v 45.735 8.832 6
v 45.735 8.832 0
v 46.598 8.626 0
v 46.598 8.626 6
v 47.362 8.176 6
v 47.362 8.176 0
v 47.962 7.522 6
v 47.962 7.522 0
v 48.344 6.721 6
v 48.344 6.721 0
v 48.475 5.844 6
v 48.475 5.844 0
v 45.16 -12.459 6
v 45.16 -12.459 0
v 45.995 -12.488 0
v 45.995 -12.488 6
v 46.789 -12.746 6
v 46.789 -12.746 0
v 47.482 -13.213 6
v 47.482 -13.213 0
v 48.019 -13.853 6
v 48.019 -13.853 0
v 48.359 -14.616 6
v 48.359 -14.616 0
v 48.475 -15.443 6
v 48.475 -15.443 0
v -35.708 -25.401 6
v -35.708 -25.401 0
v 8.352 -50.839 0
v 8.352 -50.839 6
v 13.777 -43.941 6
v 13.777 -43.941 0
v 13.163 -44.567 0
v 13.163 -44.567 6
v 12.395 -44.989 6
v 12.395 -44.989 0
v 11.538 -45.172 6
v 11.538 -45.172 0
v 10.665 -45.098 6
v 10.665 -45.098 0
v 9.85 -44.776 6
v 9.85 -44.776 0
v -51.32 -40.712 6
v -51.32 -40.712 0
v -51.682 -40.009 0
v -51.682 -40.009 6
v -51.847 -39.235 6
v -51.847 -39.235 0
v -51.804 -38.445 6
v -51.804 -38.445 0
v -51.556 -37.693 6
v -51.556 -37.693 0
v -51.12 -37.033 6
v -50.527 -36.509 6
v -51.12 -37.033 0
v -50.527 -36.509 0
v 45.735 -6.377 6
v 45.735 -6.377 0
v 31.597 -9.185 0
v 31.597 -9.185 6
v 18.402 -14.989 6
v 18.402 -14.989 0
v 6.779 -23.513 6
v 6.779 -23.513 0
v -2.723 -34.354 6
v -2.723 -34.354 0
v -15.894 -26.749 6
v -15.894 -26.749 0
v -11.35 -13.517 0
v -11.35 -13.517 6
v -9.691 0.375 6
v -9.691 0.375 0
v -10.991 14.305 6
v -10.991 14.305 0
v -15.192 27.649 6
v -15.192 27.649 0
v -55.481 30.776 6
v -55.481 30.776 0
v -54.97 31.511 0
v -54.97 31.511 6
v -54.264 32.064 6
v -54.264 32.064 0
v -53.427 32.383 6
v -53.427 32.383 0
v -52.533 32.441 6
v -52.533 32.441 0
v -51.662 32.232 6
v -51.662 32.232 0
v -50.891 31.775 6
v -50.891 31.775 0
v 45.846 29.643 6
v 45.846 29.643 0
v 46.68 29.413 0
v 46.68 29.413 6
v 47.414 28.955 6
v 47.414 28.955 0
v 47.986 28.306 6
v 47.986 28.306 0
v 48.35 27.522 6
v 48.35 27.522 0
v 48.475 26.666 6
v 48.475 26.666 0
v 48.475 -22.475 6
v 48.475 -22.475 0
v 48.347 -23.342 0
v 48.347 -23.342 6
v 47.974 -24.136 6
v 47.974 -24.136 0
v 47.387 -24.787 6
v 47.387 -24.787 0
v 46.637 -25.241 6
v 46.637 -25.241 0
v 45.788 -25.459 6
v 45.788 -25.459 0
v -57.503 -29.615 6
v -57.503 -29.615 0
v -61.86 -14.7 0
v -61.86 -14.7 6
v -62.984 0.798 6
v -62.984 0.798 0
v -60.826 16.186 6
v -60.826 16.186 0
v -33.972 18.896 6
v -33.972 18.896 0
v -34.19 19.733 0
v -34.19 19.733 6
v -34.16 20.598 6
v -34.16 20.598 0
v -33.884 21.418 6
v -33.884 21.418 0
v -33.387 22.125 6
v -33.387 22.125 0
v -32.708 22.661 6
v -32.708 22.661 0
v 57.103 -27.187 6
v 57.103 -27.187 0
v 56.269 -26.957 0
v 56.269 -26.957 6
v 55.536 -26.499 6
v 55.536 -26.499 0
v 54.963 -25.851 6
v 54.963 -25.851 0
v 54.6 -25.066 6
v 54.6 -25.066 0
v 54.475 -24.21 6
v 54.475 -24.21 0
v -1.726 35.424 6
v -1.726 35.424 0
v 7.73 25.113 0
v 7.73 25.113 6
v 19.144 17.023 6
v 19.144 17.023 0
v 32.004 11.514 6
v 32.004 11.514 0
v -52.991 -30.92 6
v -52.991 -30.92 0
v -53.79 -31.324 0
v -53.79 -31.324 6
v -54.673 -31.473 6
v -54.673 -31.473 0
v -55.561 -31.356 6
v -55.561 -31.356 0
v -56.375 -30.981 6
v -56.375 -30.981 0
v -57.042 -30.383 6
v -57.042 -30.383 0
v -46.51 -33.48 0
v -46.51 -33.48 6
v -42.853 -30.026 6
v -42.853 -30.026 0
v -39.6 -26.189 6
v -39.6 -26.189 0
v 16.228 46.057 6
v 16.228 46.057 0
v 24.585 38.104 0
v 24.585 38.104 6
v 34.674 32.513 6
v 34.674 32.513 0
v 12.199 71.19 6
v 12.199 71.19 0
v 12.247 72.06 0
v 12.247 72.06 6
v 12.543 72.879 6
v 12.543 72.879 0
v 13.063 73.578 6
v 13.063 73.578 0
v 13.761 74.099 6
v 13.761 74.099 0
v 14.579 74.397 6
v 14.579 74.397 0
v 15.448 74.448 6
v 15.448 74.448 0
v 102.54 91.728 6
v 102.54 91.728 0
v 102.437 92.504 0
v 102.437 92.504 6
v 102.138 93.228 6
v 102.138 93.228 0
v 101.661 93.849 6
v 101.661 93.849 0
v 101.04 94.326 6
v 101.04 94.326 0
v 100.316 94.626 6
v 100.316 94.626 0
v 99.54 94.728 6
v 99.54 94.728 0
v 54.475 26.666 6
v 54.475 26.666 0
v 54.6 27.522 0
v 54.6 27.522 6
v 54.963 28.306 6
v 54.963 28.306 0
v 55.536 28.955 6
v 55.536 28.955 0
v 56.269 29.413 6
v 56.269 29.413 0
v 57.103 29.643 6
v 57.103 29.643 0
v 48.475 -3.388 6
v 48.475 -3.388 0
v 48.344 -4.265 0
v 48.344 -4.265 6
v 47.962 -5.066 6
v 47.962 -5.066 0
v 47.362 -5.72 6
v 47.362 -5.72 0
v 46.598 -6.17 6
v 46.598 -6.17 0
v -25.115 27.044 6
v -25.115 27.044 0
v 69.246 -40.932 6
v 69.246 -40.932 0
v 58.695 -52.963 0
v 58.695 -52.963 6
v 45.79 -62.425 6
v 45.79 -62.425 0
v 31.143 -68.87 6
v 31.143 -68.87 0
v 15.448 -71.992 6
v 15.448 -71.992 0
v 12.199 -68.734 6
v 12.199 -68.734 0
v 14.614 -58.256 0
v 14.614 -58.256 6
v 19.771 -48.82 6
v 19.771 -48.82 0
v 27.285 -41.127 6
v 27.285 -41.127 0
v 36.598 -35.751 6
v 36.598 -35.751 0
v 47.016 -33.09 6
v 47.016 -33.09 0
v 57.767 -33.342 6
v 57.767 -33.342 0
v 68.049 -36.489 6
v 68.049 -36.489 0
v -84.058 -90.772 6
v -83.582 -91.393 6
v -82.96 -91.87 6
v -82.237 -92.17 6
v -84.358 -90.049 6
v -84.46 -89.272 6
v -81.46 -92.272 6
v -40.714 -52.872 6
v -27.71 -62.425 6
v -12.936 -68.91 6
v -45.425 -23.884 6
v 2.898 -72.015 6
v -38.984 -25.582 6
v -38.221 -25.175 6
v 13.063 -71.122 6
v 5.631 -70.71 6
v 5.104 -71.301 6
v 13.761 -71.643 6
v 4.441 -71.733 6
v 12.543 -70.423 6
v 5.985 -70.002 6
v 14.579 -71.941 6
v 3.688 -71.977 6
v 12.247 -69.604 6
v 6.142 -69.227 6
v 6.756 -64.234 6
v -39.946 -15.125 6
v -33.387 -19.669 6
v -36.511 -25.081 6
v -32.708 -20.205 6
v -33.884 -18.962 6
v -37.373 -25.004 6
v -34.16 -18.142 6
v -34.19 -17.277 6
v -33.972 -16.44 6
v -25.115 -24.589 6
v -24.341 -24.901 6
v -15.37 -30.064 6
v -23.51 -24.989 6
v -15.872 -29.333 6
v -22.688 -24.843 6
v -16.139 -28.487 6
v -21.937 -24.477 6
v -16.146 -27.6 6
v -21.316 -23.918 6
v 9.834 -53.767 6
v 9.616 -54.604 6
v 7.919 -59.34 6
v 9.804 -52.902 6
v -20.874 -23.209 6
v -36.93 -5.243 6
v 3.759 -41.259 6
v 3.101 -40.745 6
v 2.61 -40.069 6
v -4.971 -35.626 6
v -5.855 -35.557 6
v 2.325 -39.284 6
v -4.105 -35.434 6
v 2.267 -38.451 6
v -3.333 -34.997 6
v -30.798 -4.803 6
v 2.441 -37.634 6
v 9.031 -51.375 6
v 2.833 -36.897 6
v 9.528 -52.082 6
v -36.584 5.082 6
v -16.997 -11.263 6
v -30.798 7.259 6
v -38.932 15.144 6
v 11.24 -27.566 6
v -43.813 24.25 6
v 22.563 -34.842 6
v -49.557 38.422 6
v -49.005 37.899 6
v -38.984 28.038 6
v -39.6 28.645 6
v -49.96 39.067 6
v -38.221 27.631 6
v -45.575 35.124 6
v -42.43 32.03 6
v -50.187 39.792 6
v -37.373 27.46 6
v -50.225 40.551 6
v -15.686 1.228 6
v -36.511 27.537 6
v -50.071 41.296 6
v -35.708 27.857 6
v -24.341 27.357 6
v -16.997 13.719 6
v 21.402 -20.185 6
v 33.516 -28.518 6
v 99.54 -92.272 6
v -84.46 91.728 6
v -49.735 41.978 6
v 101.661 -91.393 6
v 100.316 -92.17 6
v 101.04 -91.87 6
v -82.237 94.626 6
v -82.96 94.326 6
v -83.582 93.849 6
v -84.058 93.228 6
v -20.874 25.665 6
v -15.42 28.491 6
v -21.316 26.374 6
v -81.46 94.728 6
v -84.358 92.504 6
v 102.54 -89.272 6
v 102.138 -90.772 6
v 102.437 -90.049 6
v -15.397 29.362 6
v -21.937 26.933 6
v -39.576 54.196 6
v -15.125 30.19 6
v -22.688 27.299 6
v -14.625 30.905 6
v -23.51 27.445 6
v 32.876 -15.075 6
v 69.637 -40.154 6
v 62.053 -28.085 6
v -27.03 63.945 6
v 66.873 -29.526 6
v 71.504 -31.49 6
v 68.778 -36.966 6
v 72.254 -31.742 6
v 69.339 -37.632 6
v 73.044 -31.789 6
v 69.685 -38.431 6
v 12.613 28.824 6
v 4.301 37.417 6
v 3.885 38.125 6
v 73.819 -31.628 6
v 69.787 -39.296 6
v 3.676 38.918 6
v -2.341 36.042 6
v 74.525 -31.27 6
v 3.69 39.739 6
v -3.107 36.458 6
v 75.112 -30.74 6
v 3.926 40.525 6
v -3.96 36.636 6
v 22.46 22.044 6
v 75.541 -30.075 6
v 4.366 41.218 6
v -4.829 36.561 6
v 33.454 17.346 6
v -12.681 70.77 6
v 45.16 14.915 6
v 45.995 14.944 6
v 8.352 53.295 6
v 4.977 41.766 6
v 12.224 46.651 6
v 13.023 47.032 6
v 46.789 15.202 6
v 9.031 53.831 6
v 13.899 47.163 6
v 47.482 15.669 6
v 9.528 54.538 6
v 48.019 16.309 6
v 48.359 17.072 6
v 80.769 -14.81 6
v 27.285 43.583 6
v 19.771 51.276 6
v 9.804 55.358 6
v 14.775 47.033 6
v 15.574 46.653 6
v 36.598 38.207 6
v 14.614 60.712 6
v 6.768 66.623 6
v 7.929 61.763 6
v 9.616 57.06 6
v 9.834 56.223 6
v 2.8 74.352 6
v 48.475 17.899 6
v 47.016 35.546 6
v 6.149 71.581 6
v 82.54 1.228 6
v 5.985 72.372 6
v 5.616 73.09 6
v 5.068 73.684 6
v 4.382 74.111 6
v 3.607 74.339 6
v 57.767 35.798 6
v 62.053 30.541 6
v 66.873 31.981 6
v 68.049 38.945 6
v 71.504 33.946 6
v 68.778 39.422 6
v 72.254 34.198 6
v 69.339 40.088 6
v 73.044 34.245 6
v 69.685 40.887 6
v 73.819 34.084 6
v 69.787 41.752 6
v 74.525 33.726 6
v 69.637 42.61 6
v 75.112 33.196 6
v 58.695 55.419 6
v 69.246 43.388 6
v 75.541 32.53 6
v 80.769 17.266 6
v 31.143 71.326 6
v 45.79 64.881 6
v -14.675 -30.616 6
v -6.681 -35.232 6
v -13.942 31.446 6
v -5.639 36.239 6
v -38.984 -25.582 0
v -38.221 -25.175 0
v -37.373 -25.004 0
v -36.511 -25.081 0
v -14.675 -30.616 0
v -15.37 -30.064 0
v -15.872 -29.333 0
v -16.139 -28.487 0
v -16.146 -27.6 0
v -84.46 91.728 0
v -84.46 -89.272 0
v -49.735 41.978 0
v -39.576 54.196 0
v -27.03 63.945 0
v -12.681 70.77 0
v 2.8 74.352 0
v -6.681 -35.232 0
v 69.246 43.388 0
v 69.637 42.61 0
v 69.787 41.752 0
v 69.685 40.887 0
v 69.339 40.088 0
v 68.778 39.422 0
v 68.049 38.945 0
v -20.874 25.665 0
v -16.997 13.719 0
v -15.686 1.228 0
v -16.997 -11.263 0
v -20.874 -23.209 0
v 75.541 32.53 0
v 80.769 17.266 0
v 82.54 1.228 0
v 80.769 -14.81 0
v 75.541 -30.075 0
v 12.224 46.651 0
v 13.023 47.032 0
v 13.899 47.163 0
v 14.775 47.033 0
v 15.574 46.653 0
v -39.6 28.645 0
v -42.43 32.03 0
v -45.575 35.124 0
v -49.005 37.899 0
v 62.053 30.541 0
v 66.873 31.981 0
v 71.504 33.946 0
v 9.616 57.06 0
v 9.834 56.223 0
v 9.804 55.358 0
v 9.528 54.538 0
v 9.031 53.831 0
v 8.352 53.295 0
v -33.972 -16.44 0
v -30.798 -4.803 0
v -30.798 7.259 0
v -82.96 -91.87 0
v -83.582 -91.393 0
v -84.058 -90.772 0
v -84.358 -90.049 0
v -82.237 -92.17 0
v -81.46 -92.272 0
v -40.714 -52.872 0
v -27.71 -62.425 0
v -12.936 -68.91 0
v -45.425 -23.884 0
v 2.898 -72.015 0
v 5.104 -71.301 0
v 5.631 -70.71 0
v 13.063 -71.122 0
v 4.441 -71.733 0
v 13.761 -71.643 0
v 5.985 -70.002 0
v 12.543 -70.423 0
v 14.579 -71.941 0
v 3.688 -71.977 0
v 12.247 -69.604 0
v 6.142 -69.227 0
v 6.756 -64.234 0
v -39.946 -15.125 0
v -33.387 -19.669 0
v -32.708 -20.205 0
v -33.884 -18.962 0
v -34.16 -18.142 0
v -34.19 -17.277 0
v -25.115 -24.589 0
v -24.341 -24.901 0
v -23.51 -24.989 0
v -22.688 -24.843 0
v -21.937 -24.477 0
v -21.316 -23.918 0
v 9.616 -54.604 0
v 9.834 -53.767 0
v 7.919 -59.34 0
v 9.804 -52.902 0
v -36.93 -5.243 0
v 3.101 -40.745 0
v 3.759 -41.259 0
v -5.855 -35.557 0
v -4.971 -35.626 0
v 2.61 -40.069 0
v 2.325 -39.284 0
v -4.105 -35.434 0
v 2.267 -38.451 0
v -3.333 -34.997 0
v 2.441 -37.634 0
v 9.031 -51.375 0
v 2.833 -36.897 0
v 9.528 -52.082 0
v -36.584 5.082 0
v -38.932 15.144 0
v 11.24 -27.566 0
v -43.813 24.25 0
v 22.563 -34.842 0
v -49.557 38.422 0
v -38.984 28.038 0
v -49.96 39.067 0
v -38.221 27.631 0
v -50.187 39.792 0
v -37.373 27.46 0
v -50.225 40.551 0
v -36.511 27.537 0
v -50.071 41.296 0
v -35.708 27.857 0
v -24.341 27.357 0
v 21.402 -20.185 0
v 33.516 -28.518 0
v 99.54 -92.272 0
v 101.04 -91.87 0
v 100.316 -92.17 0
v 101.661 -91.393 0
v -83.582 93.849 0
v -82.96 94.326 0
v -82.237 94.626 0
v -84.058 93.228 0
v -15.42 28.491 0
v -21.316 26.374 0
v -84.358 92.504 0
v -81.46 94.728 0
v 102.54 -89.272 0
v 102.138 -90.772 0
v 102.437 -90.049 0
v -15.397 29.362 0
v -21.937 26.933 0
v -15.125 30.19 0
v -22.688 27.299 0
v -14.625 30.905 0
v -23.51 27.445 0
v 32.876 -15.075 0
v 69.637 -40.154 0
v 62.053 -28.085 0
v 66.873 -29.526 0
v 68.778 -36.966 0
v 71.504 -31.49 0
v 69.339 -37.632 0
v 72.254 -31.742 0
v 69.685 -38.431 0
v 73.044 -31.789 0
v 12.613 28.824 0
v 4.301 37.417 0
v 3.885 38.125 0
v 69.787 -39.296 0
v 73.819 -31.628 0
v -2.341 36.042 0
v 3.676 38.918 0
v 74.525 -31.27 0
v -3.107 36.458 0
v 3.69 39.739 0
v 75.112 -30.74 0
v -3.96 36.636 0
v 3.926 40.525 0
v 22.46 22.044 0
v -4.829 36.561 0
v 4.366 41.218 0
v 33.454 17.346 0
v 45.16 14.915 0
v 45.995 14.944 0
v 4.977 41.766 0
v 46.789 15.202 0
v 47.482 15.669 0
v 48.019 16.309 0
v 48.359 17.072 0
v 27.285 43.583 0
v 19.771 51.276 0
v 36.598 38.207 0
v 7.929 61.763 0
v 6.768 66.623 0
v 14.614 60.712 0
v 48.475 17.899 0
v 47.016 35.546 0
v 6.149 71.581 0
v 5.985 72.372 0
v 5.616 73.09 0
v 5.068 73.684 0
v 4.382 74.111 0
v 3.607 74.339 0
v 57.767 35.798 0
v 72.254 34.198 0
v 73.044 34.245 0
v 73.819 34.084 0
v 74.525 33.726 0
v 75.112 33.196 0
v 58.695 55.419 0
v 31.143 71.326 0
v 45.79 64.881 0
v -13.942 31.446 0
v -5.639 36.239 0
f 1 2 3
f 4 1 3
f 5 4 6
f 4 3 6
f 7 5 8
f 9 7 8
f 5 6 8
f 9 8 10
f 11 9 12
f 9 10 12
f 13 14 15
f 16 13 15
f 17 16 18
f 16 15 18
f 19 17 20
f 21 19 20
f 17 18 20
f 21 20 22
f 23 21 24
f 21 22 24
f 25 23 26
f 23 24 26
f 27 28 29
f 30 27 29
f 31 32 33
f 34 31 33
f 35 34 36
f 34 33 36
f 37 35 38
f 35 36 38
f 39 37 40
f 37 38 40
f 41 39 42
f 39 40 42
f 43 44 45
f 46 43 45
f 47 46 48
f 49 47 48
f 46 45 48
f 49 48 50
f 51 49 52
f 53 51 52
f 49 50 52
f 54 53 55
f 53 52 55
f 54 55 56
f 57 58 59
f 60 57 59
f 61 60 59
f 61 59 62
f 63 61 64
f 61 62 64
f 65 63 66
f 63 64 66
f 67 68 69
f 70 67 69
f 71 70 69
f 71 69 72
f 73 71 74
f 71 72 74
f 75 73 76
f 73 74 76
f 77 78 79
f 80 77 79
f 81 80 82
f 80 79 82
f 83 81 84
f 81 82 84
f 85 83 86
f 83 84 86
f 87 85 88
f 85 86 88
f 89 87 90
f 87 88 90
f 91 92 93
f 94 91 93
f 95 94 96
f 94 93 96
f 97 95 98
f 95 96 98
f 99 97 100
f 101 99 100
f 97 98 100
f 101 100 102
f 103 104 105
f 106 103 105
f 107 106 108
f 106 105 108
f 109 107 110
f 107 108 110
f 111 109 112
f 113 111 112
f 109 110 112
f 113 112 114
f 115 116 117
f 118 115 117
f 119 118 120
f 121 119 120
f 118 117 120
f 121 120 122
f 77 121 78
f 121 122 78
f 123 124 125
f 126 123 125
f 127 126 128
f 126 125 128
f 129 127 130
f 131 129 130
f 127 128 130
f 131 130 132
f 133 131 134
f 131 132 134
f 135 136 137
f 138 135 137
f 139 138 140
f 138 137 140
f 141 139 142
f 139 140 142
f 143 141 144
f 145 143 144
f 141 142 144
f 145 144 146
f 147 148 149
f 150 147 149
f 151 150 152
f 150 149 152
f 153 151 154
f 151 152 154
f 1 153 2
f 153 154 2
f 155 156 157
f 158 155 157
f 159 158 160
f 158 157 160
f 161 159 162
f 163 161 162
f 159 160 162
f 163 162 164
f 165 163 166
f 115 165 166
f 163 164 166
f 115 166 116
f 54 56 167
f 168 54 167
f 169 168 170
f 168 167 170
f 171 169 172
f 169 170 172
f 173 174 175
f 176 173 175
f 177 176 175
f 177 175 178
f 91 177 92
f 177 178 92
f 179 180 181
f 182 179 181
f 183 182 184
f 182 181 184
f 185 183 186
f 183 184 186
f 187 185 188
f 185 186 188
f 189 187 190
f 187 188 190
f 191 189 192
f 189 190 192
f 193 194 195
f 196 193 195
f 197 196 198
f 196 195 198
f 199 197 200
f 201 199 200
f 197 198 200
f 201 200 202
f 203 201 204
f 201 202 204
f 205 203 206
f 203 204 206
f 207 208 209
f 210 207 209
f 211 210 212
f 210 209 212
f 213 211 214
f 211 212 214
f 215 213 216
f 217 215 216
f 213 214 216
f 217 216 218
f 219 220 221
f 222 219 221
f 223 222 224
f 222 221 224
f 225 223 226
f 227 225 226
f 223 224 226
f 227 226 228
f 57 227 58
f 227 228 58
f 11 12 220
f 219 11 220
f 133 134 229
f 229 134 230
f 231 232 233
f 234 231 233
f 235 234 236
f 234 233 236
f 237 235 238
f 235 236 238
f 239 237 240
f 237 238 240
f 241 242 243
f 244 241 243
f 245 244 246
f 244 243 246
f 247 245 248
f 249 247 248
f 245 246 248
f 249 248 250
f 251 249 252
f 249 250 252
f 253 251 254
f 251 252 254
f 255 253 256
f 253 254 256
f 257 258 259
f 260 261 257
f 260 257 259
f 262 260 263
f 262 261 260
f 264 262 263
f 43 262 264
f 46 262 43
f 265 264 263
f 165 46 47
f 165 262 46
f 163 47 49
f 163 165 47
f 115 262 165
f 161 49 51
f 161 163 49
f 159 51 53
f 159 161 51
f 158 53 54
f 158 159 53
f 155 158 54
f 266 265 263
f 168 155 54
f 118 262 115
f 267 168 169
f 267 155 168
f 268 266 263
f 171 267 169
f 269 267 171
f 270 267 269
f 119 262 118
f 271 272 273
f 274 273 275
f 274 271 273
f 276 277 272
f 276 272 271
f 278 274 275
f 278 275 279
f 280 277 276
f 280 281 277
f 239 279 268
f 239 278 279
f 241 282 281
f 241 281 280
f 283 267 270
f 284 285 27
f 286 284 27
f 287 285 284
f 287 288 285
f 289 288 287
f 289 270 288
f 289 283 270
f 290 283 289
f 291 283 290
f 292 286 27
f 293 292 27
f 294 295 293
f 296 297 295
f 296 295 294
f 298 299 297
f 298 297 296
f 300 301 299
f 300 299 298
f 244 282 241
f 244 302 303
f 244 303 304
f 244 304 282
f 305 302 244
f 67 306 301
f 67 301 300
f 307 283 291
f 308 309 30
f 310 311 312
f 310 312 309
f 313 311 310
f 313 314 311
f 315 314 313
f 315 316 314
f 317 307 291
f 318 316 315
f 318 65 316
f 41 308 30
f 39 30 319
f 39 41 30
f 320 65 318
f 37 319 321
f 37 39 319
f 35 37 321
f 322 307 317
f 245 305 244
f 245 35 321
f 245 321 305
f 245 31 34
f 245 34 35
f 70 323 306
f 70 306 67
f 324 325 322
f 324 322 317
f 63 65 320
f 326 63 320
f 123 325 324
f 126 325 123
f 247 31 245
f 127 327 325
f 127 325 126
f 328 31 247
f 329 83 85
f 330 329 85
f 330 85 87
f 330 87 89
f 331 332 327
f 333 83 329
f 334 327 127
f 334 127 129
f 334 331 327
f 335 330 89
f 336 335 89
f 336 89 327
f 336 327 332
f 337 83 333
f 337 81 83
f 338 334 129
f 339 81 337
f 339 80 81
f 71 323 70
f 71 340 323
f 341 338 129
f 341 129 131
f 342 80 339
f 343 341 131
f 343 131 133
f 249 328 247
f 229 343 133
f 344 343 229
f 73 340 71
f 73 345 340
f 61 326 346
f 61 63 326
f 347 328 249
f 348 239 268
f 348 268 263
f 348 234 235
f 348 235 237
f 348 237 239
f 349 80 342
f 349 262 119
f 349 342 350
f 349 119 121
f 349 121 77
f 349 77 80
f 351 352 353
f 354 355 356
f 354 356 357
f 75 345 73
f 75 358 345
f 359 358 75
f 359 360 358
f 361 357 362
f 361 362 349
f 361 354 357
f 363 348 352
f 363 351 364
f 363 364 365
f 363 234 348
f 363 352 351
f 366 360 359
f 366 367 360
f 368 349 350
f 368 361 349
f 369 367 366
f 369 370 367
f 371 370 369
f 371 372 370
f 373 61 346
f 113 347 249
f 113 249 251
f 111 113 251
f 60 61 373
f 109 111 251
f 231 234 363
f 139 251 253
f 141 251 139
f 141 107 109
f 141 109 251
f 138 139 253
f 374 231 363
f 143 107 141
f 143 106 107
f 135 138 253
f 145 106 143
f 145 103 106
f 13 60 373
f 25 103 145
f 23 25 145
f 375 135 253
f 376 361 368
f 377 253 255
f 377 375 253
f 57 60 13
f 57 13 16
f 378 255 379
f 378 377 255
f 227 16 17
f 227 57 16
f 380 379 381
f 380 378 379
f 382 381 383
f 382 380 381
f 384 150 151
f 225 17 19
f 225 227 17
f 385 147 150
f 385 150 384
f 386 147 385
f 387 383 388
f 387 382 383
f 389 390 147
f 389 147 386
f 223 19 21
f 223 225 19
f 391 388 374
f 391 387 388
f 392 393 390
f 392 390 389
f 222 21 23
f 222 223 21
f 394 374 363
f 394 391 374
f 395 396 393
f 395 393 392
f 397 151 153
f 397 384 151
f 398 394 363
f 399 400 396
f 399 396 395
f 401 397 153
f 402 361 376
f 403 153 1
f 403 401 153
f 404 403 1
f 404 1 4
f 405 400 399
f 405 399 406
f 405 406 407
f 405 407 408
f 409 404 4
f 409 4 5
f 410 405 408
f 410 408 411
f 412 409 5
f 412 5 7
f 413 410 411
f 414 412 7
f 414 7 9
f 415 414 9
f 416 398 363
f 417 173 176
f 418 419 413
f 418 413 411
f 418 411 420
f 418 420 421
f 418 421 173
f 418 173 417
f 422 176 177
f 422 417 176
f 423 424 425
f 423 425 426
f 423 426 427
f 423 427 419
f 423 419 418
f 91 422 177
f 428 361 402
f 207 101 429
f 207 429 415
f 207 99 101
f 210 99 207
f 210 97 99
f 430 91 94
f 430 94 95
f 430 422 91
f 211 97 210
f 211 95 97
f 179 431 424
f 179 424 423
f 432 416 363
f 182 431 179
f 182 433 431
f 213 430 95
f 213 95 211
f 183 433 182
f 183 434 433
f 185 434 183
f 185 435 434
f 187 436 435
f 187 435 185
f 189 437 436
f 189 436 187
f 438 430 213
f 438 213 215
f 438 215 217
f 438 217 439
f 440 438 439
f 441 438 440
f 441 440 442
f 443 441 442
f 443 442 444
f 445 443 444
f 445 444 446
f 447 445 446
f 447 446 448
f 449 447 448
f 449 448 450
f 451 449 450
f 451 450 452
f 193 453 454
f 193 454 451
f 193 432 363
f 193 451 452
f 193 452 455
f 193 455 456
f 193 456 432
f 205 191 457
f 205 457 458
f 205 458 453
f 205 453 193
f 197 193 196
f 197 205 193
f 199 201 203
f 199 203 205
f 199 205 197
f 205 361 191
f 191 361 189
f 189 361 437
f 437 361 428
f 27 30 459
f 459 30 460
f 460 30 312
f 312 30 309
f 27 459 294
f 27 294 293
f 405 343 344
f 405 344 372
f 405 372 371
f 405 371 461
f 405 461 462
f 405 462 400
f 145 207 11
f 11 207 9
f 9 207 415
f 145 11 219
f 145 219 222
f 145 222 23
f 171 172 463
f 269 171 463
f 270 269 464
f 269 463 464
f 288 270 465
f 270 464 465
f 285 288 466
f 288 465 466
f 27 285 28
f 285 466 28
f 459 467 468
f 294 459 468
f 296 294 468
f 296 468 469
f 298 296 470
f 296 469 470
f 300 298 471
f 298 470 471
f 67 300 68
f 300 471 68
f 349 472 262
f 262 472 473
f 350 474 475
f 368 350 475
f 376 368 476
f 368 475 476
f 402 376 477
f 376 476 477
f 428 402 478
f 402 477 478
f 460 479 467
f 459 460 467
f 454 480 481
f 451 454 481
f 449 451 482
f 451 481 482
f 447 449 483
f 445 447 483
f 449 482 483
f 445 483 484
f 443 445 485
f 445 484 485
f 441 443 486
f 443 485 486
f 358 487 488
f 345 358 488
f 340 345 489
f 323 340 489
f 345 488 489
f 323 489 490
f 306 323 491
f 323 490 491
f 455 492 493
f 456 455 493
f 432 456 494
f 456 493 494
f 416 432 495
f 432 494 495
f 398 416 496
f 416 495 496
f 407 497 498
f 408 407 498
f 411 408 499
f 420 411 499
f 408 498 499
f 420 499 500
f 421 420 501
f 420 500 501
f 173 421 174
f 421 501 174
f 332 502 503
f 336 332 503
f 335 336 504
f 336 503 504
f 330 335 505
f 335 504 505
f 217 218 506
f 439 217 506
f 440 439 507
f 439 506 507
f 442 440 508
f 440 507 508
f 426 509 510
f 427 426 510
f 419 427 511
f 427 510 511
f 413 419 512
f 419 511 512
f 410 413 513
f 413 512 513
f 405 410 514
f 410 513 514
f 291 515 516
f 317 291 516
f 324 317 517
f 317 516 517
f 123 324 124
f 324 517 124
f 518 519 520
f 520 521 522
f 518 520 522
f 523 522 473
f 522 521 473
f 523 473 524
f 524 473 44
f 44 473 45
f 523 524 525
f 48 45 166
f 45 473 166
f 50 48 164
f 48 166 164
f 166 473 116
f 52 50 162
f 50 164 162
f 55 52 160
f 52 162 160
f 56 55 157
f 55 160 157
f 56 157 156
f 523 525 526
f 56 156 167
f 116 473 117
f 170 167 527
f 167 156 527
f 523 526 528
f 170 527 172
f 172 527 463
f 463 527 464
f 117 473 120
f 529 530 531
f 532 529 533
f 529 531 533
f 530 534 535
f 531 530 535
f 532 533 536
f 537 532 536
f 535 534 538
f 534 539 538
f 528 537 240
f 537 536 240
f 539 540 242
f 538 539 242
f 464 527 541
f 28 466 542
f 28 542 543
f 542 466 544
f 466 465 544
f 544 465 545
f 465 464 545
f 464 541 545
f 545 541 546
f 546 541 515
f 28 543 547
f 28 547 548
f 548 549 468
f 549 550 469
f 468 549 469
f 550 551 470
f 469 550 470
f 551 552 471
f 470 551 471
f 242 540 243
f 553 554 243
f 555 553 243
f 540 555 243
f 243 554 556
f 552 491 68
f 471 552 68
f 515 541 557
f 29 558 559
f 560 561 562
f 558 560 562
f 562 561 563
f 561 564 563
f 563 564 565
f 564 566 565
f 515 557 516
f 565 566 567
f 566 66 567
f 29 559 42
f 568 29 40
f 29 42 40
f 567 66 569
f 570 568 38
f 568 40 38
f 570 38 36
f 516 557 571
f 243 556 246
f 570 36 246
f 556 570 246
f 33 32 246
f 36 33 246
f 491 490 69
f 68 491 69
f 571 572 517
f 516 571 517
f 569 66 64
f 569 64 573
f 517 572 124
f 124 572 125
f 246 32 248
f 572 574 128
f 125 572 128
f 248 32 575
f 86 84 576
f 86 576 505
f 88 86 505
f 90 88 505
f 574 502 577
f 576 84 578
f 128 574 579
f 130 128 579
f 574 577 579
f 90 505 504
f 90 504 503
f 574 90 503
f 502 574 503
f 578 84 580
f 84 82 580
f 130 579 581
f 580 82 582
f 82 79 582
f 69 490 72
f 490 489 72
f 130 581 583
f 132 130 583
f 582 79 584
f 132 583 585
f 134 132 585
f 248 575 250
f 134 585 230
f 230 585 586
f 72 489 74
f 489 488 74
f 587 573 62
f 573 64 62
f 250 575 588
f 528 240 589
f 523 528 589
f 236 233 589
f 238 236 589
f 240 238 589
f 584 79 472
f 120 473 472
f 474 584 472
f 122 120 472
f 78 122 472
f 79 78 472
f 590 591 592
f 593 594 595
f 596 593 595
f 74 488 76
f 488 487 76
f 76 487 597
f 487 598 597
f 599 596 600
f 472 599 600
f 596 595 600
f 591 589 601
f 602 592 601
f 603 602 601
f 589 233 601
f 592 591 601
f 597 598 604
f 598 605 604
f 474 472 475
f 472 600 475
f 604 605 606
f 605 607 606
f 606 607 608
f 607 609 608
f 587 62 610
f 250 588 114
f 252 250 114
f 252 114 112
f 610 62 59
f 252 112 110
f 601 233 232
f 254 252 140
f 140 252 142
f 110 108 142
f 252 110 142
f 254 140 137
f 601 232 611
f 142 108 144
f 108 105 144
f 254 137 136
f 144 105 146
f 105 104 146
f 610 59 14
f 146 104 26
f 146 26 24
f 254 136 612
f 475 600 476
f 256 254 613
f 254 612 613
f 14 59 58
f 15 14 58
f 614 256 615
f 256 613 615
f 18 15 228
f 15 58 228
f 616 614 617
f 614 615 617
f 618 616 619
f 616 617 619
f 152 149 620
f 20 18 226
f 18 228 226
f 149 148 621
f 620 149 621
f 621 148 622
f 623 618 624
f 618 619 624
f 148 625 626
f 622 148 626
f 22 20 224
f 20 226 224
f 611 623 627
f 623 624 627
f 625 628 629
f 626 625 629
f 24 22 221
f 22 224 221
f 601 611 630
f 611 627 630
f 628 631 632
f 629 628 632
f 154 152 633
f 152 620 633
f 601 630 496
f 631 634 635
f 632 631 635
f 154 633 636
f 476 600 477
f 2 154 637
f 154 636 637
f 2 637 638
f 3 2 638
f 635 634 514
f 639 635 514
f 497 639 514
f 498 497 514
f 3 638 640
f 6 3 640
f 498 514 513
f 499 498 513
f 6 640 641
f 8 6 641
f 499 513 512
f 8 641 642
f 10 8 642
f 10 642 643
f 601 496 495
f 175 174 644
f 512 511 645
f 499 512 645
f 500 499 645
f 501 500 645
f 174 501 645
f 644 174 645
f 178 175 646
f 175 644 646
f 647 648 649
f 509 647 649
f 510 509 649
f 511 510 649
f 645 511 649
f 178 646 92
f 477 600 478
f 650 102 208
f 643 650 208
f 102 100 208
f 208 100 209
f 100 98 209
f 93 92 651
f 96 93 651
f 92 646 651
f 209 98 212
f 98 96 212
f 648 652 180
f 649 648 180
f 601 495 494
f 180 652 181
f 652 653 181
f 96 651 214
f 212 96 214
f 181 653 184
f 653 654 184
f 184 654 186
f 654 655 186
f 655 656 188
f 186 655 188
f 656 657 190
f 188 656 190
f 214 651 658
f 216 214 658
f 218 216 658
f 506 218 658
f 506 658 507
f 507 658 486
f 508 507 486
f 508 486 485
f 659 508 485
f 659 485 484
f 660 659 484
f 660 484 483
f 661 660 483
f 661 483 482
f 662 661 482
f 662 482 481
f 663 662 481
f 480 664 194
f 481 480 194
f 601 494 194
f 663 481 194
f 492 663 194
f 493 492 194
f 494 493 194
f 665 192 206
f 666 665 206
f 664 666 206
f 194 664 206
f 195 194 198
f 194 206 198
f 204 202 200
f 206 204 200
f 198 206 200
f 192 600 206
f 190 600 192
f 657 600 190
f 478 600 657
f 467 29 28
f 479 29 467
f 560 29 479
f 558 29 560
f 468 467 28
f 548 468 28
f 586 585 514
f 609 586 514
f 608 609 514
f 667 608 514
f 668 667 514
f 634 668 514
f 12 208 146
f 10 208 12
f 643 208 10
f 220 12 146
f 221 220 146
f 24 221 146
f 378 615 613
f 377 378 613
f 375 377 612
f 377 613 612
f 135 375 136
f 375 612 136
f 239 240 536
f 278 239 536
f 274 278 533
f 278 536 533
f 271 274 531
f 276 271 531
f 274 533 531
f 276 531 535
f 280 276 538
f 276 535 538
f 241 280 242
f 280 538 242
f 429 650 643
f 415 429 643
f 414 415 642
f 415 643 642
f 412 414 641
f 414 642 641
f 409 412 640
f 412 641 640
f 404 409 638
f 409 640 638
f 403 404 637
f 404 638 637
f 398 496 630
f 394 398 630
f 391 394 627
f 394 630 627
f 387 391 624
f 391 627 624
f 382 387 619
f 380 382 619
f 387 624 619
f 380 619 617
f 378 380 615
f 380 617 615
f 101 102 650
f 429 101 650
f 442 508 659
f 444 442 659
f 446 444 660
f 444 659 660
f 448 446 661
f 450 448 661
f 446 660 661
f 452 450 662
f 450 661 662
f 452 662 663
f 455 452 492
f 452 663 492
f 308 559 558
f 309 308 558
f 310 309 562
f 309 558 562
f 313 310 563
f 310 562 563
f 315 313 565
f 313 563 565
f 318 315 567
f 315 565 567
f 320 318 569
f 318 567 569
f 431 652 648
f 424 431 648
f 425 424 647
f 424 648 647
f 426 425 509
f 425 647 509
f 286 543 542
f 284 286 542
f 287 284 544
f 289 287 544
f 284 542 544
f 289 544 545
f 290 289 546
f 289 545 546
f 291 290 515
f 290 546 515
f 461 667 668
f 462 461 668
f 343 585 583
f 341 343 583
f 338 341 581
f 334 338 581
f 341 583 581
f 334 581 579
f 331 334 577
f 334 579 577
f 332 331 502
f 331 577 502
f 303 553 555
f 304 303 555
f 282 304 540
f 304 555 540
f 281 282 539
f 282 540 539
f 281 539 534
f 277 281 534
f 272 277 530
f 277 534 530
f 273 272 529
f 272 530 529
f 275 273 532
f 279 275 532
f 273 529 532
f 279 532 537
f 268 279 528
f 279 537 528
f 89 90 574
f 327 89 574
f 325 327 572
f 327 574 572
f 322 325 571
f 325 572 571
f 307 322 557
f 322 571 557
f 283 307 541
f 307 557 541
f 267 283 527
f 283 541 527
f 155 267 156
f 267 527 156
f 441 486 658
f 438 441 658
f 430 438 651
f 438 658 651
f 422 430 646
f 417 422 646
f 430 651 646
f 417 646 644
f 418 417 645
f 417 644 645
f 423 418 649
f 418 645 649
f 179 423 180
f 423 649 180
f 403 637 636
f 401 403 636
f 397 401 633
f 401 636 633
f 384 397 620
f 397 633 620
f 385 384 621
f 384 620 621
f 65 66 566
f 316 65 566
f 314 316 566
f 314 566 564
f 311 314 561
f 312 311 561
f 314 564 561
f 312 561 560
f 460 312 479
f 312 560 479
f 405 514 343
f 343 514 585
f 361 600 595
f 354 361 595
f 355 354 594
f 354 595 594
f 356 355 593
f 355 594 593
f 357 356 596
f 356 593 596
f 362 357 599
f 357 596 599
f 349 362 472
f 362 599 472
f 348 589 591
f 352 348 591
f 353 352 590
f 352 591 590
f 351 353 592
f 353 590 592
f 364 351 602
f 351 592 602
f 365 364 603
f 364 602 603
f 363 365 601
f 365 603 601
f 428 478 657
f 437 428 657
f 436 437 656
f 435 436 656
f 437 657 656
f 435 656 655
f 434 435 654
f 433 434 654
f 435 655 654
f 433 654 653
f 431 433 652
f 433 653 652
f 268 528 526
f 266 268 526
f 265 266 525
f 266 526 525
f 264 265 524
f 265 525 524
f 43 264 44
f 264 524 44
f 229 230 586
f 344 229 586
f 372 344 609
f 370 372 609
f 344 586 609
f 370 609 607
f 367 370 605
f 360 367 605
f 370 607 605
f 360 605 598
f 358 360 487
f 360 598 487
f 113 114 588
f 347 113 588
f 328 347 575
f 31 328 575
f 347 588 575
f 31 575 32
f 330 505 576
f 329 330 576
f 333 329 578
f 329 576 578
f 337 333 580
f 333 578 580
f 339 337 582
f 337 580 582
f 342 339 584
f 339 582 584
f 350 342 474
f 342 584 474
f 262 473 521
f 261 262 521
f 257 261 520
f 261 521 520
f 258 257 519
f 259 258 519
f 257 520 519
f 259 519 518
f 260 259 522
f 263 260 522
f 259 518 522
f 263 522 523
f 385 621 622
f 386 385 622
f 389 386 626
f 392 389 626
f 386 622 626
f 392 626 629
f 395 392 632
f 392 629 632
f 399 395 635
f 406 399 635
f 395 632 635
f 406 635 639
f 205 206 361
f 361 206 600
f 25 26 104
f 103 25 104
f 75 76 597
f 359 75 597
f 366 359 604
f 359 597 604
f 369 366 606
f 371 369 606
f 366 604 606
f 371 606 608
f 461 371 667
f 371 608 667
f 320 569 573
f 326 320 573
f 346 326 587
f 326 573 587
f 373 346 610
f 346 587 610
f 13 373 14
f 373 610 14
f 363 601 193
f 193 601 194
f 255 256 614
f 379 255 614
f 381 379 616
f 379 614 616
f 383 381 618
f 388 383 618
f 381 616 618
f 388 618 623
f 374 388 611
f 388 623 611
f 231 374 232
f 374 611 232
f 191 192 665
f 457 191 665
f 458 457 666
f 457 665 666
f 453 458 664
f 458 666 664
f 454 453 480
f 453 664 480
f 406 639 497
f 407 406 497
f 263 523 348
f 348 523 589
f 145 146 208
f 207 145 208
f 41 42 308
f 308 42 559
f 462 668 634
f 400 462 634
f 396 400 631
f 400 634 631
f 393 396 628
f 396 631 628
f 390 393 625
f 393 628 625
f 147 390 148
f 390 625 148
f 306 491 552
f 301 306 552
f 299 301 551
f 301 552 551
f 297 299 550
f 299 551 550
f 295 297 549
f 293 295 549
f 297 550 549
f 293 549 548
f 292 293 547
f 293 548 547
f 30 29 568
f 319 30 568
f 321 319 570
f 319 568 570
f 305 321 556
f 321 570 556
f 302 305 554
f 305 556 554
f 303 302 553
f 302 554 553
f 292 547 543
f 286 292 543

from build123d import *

# Parameters (mm, degrees)
F1_DEPTH = 6


with BuildPart() as f1:
    # F0 (on Top) → F1 (new body)
    with BuildSketch(Plane.XY):
        with BuildLine():
            Line((99.539605, 94.727916), (-81.460395, 94.727916))
            ThreePointArc((-81.460395, 94.727916), (-83.581716, 93.849236), (-84.460395, 91.727916))
            Line((-84.460395, 91.727916), (-84.460395, -89.272084))
            ThreePointArc((-84.460395, -89.272084), (-83.581716, -91.393405), (-81.460395, -92.272084))
            Line((-81.460395, -92.272084), (99.539605, -92.272084))
            ThreePointArc((99.539605, -92.272084), (101.660925, -91.393405), (102.539605, -89.272084))
            Line((102.539605, -89.272084), (102.539605, 91.727916))
            ThreePointArc((102.539605, 91.727916), (101.660925, 93.849236), (99.539605, 94.727916))
        make_face()
        with BuildLine():
            ThreePointArc((9.615662, -54.603753), (7.269883, -61.770541), (6.141787, -69.226607))
            ThreePointArc((6.141787, -69.226607), (5.104101, -71.300549), (2.89785, -72.015028))
            ThreePointArc((2.89785, -72.015028), (-27.710395, -62.424951), (-51.319768, -40.712472))
            ThreePointArc((-51.319768, -40.712472), (-51.804137, -38.444562), (-50.526893, -36.508929))
            ThreePointArc((-50.526893, -36.508929), (-44.633798, -31.803936), (-39.600068, -26.189038))
            ThreePointArc((-39.600068, -26.189038), (-37.802948, -25.058948), (-35.707818, -25.401249))
            Line((-35.707818, -25.401249), (8.351782, -50.839072))
            ThreePointArc((8.351782, -50.839072), (9.695789, -52.482357), (9.615662, -54.603753))
        make_face(mode=Mode.SUBTRACT)
        with BuildLine():
            ThreePointArc((-55.480573, 30.775598), (-53.42718, 32.382849), (-50.891278, 31.775494))
            ThreePointArc((-50.891278, 31.775494), (-36.41773, -0.091822), (-52.990603, -30.919558))
            ThreePointArc((-52.990603, -30.919558), (-55.561454, -31.355915), (-57.502732, -29.614904))
            ThreePointArc((-57.502732, -29.614904), (-62.984472, 0.797757), (-55.480573, 30.775598))
        make_face(mode=Mode.SUBTRACT)
        with BuildLine():
            ThreePointArc((15.448073, -71.992174), (13.062505, -71.122238), (12.198598, -68.734479))
            ThreePointArc((12.198598, -68.734479), (31.757227, -38.120161), (68.049318, -36.489051))
            ThreePointArc((68.049318, -36.489051), (69.685225, -38.431095), (69.245828, -40.932026))
            ThreePointArc((69.245828, -40.932026), (45.789605, -62.424951), (15.448073, -71.992174))
        make_face(mode=Mode.SUBTRACT)
        with BuildLine():
            ThreePointArc((3.7593, -41.259398), (2.324711, -39.284367), (2.833078, -36.896825))
            ThreePointArc((2.833078, -36.896825), (21.402309, -20.184916), (45.159862, -12.459445))
            ThreePointArc((45.159862, -12.459445), (47.481717, -13.212957), (48.474849, -15.442863))
            Line((48.474849, -15.442863), (48.474849, -22.475358))
            ThreePointArc((48.474849, -22.475358), (47.704242, -24.482796), (45.788312, -25.458937))
            ThreePointArc((45.788312, -25.458937), (27.818105, -31.297402), (13.776743, -43.940825))
            ThreePointArc((13.776743, -43.940825), (11.973415, -45.111999), (9.84962, -44.775645))
            Line((9.84962, -44.775645), (3.7593, -41.259398))
        make_face(mode=Mode.SUBTRACT)
        with BuildLine():
            ThreePointArc((-1.726285, 35.423831), (19.144031, 17.022716), (45.735172, 8.832332))
            ThreePointArc((45.735172, 8.832332), (47.686293, 7.870842), (48.474849, 5.843648))
            Line((48.474849, 5.843648), (48.474849, -3.387817))
            ThreePointArc((48.474849, -3.387817), (47.686293, -5.415011), (45.735172, -6.376501))
            ThreePointArc((45.735172, -6.376501), (18.402309, -14.988763), (-2.722561, -34.353586))
            ThreePointArc((-2.722561, -34.353586), (-4.530796, -35.562562), (-6.680676, -35.231874))
            Line((-6.680676, -35.231874), (-14.675359, -30.616142))
            ThreePointArc((-14.675359, -30.616142), (-16.036683, -28.919635), (-15.893797, -26.749169))
            ThreePointArc((-15.893797, -26.749169), (-9.691308, 0.374626), (-15.191982, 27.649407))
            ThreePointArc((-15.191982, 27.649407), (-15.291169, 29.786156), (-13.941714, 31.445826))
            Line((-13.941714, 31.445826), (-5.639215, 36.239276))
            ThreePointArc((-5.639215, 36.239276), (-3.527171, 36.578104), (-1.726285, 35.423831))
        make_face(mode=Mode.SUBTRACT)
        with BuildLine():
            Line((54.474849, -24.209906), (54.474849, 26.665738))
            ThreePointArc((54.474849, 26.665738), (55.225973, 28.651325), (57.103219, 29.642631))
            ThreePointArc((57.103219, 29.642631), (64.482729, 31.19452), (71.50392, 33.945594))
            ThreePointArc((71.50392, 33.945594), (73.818849, 34.083902), (75.540732, 32.530472))
            ThreePointArc((75.540732, 32.530472), (82.539605, 1.227916), (75.540732, -30.074641))
            ThreePointArc((75.540732, -30.074641), (73.818849, -31.628071), (71.50392, -31.489762))
            ThreePointArc((71.50392, -31.489762), (64.482729, -28.738689), (57.103219, -27.186799))
            ThreePointArc((57.103219, -27.186799), (55.225973, -26.195493), (54.474849, -24.209906))
        make_face(mode=Mode.SUBTRACT)
        with BuildLine():
            ThreePointArc((-33.971698, 18.896247), (-34.051825, 21.017643), (-32.707818, 22.660928))
            Line((-32.707818, 22.660928), (-25.115336, 27.04445))
            ThreePointArc((-25.115336, 27.04445), (-22.687615, 27.299325), (-20.874126, 25.665295))
            ThreePointArc((-20.874126, 25.665295), (-15.685803, 1.227916), (-20.874126, -23.209464))
            ThreePointArc((-20.874126, -23.209464), (-22.687615, -24.843494), (-25.115336, -24.588619))
            Line((-25.115336, -24.588619), (-32.707818, -20.205097))
            ThreePointArc((-32.707818, -20.205097), (-34.051825, -18.561812), (-33.971698, -16.440416))
            ThreePointArc((-33.971698, -16.440416), (-30.39564, 1.227916), (-33.971698, 18.896247))
        make_face(mode=Mode.SUBTRACT)
        with BuildLine():
            ThreePointArc((-39.600068, 28.644869), (-43.965035, 33.61509), (-49.005428, 37.898835))
            ThreePointArc((-49.005428, 37.898835), (-50.187345, 39.792027), (-49.734823, 41.977509))
            ThreePointArc((-49.734823, 41.977509), (-27.029704, 63.944863), (2.799576, 74.351643))
            ThreePointArc((2.799576, 74.351643), (5.068332, 73.684327), (6.148737, 71.58069))
            ThreePointArc((6.148737, 71.58069), (7.281697, 64.176766), (9.615662, 57.059584))
            ThreePointArc((9.615662, 57.059584), (9.695789, 54.938188), (8.351782, 53.294903))
            Line((8.351782, 53.294903), (-35.707818, 27.857081))
            ThreePointArc((-35.707818, 27.857081), (-37.802948, 27.51478), (-39.600068, 28.644869))
        make_face(mode=Mode.SUBTRACT)
        with BuildLine():
            ThreePointArc((48.474849, 17.898695), (47.481717, 15.668789), (45.159862, 14.915277))
            ThreePointArc((45.159862, 14.915277), (22.460423, 22.04401), (4.301384, 37.417126))
            ThreePointArc((4.301384, 37.417126), (3.689978, 39.739023), (4.977435, 41.765714))
            Line((4.977435, 41.765714), (12.22419, 46.650974))
            ThreePointArc((12.22419, 46.650974), (14.341654, 47.130905), (16.228378, 46.056541))
            ThreePointArc((16.228378, 46.056541), (29.451174, 34.987266), (45.84648, 29.642631))
            ThreePointArc((45.84648, 29.642631), (47.723726, 28.651325), (48.474849, 26.665738))
            Line((48.474849, 26.665738), (48.474849, 17.898695))
        make_face(mode=Mode.SUBTRACT)
        with BuildLine():
            ThreePointArc((69.245828, 43.387857), (69.685225, 40.886926), (68.049318, 38.944882))
            ThreePointArc((68.049318, 38.944882), (31.757227, 40.575992), (12.198598, 71.19031))
            ThreePointArc((12.198598, 71.19031), (13.062505, 73.578069), (15.448073, 74.448005))
            ThreePointArc((15.448073, 74.448005), (45.789605, 64.880783), (69.245828, 43.387857))
        make_face(mode=Mode.SUBTRACT)
    extrude(amount=F1_DEPTH)


solid = f1.part
